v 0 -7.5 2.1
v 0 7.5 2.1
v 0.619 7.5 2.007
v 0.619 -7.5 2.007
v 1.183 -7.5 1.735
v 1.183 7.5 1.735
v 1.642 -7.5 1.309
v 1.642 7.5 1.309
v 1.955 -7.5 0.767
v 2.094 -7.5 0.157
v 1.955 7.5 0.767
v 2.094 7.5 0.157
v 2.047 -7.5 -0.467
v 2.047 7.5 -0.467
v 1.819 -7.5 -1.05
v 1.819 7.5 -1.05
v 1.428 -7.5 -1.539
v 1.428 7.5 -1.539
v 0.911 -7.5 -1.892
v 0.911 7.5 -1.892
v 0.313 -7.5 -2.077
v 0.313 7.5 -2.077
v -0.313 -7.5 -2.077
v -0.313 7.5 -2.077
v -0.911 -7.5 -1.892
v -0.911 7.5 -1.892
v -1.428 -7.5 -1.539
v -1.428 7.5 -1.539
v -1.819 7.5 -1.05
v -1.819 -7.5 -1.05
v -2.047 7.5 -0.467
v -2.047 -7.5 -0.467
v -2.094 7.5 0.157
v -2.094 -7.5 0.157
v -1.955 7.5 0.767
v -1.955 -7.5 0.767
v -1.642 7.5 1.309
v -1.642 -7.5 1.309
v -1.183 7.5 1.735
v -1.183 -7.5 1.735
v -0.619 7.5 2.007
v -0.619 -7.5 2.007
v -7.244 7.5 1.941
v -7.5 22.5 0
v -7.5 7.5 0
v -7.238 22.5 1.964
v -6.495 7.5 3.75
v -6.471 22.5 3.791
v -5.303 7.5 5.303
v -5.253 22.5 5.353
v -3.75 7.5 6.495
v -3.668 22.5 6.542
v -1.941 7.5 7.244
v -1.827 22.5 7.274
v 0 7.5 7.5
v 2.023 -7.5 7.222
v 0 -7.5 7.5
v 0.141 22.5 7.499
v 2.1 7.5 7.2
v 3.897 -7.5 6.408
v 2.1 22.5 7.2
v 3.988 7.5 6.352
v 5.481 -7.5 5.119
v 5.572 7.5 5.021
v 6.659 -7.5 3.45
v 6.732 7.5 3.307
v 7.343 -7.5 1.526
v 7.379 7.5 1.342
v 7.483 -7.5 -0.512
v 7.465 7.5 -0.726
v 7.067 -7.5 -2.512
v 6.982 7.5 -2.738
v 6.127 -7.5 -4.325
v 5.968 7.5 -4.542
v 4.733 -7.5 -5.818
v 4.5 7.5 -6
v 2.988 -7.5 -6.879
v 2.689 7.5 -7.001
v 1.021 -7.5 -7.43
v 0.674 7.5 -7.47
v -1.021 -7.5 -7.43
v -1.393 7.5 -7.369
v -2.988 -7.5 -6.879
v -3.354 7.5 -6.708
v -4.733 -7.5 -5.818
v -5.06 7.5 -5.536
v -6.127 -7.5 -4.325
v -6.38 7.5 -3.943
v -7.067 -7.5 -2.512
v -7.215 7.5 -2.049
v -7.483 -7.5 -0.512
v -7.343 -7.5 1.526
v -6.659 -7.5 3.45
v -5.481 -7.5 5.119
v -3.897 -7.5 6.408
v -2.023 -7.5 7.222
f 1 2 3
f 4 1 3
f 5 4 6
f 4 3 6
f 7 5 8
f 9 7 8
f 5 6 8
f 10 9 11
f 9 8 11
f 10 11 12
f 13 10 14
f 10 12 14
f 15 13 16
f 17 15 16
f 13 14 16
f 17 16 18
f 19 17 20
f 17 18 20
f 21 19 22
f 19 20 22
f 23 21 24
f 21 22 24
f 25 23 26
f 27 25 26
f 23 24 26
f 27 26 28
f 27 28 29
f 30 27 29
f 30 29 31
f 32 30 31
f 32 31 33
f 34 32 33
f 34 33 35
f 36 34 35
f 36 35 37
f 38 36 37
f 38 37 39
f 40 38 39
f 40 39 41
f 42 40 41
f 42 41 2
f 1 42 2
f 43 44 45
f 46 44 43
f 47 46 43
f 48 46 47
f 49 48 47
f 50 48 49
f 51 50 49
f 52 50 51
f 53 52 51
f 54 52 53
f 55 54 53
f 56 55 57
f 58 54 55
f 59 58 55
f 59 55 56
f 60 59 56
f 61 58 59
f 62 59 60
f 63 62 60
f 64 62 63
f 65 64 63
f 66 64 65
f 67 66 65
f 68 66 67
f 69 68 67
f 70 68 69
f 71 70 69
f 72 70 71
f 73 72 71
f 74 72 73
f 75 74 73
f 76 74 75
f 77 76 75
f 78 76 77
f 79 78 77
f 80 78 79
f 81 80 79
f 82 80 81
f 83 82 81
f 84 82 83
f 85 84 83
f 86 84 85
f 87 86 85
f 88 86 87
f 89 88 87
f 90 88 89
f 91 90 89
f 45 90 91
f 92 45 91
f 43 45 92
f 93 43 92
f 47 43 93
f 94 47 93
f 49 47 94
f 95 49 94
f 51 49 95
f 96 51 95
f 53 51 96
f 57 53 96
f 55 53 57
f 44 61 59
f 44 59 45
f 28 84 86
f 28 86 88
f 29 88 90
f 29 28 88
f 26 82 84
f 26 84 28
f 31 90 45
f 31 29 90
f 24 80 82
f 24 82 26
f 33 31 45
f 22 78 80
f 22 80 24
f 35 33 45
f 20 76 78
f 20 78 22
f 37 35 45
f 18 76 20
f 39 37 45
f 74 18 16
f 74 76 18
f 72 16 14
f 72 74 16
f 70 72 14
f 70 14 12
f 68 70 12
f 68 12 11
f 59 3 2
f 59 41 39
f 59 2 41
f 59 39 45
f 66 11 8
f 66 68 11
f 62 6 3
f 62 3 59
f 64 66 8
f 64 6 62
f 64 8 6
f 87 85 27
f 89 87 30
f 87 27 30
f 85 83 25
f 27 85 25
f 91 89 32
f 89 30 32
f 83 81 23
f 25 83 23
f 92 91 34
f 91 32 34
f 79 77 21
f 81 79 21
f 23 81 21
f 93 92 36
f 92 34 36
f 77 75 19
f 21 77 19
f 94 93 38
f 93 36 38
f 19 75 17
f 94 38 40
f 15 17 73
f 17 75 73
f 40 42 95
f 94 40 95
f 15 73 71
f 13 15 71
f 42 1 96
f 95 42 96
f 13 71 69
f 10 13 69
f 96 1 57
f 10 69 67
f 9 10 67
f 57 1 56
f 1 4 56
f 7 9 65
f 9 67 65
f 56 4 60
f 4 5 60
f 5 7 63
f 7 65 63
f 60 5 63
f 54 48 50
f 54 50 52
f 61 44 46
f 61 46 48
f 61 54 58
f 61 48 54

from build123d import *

# Parameters (mm, degrees)
CROQUIS1_R              = 7.5
SALIENTE_EXTRUIR1_DEPTH = 7.5
SALIENTE_EXTRUIR2_START = 15
SALIENTE_EXTRUIR2_DEPTH = 15
CROQUIS3_R              = 2.1
CORTAR_EXTRUIR2_DEPTH   = 19.371173071


with BuildPart() as part:
    # Croquis1 → Saliente-Extruir1 (new, symmetric)
    with BuildSketch(Plane(origin=(0, 0, 0), x_dir=(1, 0, 0), z_dir=(0, 1, 0))):
        with Locations(Location((0, 0, 0), (0, 0, 270))):
            Circle(CROQUIS1_R)
    extrude(amount=SALIENTE_EXTRUIR1_DEPTH, both=True)

    # Croquis2 → Saliente-Extruir2 (add)
    with BuildSketch(Plane(origin=(0, 7.5, 0), x_dir=(1, 0, 0), z_dir=(0, 1, 0)).offset(SALIENTE_EXTRUIR2_START)):
        with BuildLine():
            Line((2.1, -7.2), (-7.5, 0))
            ThreePointArc((-7.5, 0), (-4.5, -6), (2.1, -7.2))
        make_face()
    extrude(amount=-SALIENTE_EXTRUIR2_DEPTH)

    # Croquis3 → Cortar-Extruir2 (cut, through all)
    with BuildSketch(Plane(origin=(0, 7.5, 0), x_dir=(1, 0, 0), z_dir=(0, 1, 0))):
        with Locations(Location((0, 0, 0), (0, 0, 270))):
            Circle(CROQUIS3_R)
    extrude(amount=-CORTAR_EXTRUIR2_DEPTH, mode=Mode.SUBTRACT)


solid = part.part
